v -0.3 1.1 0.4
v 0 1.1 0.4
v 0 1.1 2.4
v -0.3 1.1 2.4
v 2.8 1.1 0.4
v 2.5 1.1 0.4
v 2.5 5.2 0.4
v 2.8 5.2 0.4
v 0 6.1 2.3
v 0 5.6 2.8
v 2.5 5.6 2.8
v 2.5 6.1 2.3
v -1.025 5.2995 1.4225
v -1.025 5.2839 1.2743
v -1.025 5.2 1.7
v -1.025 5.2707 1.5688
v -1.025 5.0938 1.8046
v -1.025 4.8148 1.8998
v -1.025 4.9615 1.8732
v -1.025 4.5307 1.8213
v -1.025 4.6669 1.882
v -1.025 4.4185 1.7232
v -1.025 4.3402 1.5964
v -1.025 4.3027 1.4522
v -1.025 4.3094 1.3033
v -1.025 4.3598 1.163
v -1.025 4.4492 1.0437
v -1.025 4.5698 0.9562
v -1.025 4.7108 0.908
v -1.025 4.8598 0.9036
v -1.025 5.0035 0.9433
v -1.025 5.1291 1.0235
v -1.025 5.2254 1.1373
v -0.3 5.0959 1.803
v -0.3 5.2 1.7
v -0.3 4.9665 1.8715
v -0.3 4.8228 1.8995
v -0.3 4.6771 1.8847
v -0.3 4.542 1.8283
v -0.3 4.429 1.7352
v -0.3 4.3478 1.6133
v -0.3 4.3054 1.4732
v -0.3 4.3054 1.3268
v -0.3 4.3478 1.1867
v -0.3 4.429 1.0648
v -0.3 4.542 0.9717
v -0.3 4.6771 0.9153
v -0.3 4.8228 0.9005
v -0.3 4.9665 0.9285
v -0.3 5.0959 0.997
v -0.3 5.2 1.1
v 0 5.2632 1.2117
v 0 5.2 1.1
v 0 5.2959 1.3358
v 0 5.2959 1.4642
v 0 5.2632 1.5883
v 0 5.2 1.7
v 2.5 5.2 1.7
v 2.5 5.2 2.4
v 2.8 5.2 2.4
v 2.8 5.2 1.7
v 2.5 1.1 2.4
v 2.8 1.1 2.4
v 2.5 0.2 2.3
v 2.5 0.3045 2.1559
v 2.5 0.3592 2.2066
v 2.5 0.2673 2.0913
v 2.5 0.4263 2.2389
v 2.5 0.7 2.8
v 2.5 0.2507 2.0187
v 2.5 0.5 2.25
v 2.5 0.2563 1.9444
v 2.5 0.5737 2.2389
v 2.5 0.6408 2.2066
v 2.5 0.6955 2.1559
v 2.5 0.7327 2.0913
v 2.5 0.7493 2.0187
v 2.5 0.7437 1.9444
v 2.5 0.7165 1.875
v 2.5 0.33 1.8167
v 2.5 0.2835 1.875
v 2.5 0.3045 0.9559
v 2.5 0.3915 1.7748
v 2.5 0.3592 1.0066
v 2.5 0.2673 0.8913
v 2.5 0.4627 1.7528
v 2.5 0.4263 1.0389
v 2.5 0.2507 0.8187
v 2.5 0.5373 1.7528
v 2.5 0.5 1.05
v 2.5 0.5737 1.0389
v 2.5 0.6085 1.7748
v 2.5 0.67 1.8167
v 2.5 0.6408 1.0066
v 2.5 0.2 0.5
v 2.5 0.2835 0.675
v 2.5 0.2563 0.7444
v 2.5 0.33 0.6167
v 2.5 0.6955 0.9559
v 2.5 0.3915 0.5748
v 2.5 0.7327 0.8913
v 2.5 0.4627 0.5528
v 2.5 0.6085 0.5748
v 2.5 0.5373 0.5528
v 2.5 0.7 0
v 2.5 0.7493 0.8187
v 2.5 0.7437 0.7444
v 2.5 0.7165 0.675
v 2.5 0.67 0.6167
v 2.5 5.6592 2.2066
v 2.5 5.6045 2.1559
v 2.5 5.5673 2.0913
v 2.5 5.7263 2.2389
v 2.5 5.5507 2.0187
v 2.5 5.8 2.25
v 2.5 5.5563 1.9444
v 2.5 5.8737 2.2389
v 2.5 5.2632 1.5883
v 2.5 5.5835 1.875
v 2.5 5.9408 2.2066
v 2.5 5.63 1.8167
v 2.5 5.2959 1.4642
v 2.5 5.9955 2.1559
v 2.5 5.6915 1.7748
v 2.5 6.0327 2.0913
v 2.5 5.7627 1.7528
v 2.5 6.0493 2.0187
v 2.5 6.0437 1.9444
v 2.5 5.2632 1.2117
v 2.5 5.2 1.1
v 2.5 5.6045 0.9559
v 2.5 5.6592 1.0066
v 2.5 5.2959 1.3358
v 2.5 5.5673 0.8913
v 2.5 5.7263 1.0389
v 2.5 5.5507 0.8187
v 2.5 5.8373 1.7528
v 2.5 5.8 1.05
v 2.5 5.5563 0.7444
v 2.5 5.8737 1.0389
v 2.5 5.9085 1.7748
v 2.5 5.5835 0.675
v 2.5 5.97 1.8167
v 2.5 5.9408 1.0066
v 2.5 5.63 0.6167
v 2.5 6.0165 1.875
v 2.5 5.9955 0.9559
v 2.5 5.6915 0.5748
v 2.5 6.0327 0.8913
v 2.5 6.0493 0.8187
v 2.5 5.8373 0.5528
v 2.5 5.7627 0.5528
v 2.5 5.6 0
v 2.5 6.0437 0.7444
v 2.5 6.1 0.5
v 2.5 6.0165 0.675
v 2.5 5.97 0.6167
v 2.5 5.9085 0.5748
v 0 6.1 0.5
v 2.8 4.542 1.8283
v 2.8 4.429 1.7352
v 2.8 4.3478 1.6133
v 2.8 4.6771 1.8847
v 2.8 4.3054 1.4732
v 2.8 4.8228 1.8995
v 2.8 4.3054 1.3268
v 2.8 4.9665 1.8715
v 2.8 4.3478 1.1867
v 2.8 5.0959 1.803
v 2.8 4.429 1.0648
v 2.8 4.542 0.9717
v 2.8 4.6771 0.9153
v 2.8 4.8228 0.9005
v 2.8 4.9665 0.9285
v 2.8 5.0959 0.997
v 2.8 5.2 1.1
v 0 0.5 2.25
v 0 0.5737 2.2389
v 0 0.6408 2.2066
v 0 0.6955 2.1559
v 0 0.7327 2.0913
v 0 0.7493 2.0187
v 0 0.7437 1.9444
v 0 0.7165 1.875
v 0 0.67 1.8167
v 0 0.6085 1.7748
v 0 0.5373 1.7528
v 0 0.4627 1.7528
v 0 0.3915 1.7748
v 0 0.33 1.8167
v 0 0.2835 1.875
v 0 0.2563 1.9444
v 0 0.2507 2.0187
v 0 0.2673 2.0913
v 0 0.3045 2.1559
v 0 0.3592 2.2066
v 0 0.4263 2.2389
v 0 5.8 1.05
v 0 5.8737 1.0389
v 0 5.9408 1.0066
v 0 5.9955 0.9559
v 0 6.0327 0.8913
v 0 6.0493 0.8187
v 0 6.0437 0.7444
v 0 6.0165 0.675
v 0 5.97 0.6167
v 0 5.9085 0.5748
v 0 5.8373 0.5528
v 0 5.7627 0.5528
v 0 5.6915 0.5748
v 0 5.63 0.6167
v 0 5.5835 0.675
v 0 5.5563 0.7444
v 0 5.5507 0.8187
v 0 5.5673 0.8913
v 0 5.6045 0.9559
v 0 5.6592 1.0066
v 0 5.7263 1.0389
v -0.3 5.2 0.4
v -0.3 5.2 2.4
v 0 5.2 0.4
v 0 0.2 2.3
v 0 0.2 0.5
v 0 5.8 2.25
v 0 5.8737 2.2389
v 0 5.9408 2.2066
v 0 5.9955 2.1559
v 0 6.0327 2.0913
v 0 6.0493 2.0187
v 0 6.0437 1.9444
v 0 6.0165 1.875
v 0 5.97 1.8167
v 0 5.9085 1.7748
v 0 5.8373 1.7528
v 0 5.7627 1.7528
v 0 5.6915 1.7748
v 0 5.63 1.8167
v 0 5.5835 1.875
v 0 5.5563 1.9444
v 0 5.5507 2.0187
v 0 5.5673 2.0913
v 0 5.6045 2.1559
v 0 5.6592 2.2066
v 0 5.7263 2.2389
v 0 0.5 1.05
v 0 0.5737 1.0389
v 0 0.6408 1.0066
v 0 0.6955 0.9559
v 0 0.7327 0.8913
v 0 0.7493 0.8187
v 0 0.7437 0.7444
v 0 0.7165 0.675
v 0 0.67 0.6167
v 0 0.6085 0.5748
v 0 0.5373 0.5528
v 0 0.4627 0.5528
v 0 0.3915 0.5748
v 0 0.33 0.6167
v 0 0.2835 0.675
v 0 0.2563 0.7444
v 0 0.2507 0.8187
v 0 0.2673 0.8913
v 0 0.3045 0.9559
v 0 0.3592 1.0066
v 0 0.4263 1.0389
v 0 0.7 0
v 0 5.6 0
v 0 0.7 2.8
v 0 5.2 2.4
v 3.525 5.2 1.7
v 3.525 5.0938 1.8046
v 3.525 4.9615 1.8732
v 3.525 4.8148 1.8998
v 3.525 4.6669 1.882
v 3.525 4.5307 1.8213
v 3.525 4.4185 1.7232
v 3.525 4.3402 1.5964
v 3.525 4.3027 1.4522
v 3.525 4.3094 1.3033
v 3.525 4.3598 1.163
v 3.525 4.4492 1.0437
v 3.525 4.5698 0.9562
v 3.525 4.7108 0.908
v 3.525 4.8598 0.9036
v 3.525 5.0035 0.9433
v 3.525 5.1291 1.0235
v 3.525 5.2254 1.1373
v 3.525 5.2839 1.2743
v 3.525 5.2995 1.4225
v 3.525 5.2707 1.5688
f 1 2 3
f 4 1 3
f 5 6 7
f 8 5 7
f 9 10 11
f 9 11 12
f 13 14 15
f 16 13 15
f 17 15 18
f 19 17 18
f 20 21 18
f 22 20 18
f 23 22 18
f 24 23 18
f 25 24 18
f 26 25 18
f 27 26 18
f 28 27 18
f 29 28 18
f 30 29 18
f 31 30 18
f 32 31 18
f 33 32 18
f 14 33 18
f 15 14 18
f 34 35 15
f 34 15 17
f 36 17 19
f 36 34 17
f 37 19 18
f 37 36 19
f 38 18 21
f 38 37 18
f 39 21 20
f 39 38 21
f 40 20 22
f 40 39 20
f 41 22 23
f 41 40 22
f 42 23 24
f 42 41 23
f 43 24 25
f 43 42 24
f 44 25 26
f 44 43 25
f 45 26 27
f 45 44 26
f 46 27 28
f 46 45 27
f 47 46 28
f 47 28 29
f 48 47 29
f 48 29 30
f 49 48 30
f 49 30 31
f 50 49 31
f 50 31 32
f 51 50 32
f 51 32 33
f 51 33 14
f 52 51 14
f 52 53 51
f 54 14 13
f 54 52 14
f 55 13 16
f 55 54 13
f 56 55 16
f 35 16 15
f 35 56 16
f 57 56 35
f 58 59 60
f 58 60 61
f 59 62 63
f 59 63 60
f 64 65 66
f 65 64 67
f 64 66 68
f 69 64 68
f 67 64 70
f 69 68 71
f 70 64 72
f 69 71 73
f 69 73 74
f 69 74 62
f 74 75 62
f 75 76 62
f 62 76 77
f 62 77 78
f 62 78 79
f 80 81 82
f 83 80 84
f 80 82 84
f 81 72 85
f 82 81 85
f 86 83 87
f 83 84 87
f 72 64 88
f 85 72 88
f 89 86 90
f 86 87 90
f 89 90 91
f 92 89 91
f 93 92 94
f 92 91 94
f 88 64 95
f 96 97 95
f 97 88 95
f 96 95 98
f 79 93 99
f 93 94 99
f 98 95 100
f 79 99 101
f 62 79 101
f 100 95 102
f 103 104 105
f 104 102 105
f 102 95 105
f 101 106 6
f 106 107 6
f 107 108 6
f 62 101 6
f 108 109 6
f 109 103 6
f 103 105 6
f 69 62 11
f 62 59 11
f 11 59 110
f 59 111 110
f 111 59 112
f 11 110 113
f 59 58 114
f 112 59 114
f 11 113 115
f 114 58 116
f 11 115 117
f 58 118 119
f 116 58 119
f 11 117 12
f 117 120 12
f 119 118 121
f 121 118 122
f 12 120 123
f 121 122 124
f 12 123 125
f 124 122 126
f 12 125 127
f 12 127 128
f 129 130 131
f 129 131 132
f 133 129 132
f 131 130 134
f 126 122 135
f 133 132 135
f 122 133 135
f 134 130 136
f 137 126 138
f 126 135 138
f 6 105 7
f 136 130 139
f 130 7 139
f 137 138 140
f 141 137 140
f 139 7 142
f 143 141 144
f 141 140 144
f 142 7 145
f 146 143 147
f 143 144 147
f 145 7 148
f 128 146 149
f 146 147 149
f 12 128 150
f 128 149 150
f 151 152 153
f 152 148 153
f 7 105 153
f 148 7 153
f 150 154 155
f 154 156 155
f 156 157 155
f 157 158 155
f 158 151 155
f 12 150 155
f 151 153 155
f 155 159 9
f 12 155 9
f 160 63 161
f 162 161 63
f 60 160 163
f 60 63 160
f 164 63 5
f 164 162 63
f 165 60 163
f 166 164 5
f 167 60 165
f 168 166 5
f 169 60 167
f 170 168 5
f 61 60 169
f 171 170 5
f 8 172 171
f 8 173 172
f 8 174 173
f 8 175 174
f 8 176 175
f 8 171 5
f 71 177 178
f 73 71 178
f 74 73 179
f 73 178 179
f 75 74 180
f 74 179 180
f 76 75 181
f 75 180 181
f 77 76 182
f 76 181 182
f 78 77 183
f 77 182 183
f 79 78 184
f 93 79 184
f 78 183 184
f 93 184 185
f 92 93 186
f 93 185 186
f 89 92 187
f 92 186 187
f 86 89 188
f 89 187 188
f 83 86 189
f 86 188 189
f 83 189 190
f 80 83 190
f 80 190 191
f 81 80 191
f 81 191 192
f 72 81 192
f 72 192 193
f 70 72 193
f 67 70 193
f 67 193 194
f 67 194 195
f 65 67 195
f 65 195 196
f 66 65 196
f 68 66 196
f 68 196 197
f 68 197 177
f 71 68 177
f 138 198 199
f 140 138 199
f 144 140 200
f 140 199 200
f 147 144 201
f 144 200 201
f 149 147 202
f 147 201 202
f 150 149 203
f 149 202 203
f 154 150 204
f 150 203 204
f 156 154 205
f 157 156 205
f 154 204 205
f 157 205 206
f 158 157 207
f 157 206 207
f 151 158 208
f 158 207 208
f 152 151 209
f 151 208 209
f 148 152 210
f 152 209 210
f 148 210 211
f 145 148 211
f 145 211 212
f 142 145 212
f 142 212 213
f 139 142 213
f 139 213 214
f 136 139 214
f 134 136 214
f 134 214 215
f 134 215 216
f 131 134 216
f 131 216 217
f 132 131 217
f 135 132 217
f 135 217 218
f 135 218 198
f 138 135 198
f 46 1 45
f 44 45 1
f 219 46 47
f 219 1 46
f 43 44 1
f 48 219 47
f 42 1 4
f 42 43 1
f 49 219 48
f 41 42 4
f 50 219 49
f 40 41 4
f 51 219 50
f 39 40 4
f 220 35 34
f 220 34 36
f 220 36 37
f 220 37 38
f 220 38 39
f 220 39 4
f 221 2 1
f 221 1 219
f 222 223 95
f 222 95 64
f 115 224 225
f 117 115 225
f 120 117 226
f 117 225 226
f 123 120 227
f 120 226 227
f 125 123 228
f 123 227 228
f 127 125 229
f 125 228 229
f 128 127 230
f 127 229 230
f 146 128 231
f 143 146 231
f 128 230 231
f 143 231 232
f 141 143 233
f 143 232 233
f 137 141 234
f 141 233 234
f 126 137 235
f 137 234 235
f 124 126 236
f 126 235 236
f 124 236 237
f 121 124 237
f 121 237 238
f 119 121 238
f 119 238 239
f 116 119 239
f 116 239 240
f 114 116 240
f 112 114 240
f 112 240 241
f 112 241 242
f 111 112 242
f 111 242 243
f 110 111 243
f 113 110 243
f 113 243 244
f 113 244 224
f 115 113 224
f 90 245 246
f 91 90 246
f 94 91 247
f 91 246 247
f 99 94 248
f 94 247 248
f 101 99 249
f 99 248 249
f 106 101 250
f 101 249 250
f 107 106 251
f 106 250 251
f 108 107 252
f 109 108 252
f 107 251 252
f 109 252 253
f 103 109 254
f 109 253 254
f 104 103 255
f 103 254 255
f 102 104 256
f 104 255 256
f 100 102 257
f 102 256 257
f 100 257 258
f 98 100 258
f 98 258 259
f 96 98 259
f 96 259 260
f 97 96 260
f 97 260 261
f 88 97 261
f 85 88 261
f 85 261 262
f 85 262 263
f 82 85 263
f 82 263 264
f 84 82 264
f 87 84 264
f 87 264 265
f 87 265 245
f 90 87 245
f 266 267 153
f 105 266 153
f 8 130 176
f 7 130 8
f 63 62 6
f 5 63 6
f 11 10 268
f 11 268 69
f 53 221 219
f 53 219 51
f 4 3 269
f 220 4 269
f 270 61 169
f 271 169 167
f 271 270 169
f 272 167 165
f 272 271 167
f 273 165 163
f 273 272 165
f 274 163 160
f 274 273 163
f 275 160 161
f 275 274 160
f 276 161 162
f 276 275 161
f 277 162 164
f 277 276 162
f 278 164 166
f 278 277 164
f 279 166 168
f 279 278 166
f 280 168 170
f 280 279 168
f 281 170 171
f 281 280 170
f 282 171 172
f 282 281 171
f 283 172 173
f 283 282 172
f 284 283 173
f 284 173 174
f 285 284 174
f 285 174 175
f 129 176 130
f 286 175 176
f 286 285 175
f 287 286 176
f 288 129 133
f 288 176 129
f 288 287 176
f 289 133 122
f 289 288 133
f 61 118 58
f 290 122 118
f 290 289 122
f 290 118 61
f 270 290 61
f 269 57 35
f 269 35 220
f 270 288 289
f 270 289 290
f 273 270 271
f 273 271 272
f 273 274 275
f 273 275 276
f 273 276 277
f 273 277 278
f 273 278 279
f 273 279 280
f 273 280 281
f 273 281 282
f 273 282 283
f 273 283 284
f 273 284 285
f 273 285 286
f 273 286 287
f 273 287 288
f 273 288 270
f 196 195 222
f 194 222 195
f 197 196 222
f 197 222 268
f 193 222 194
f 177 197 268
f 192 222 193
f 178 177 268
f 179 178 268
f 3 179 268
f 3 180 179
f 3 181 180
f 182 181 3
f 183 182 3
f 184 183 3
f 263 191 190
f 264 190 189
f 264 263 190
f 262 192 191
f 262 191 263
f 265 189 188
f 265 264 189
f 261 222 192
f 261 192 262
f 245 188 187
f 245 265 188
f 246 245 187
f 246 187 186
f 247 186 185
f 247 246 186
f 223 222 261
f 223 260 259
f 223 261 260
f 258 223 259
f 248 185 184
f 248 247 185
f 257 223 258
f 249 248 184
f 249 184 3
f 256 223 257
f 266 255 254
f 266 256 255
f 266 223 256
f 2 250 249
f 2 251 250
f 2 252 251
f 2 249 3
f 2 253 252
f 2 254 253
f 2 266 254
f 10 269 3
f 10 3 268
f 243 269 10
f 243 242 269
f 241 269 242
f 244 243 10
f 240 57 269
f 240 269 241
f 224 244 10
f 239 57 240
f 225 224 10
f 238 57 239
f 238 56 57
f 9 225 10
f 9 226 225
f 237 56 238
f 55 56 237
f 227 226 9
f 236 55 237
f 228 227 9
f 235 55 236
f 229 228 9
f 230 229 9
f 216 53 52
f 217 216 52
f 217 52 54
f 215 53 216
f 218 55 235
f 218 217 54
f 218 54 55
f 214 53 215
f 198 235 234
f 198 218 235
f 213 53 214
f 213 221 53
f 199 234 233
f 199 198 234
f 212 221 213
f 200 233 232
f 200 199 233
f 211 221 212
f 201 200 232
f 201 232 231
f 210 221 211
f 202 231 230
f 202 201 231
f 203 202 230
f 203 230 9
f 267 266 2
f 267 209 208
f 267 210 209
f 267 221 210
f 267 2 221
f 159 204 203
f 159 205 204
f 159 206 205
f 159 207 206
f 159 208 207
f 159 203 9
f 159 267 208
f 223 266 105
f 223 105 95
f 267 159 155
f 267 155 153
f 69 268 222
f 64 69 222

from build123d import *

# Parameters (mm, degrees)
SKETCH1_W           = 2.5
SKETCH1_H           = 6.3
BOSS_EXTRUDE2_DEPTH = 2.8
SKETCH3_W           = 2
SKETCH3_H           = 4.1
BOSS_EXTRUDE3_DEPTH = 0.3
SKETCH4_W           = 2
SKETCH4_H           = 4.1
BOSS_EXTRUDE4_DEPTH = 0.3
SKETCH5_R           = 0.25
CUT_EXTRUDE1_DEPTH  = 10.3
FILLET1_R           = 0.2
SKETCH6_R           = 0.5
BOSS_EXTRUDE5_DEPTH = 2.275
CUT_EXTRUDE2_DEPTH  = 10
CUT_EXTRUDE3_DEPTH  = 10


with BuildPart() as part:
    # Sketch1 → Boss-Extrude2 (new body)
    with BuildSketch(Plane.XY):
        with Locations((1.25, 3.15)):
            Rectangle(SKETCH1_W, SKETCH1_H)
    extrude(amount=BOSS_EXTRUDE2_DEPTH)

    # Sketch3 → Boss-Extrude3 (add)
    with BuildSketch(Plane(origin=(2.5, 0, 0), x_dir=(0, 0, -1), z_dir=(1, 0, 0))):
        with Locations((-1.4, 3.15)):
            Rectangle(SKETCH3_W, SKETCH3_H)
    extrude(amount=BOSS_EXTRUDE3_DEPTH)

    # Sketch4 → Boss-Extrude4 (add)
    with BuildSketch(Plane.ZY):
        with Locations((1.4, 3.15)):
            Rectangle(SKETCH4_W, SKETCH4_H)
    extrude(amount=BOSS_EXTRUDE4_DEPTH)

    # Sketch5 → Cut-Extrude1 (cut)
    with BuildSketch(Plane.ZY):
        with Locations((0.8, 0.5)):
            Circle(SKETCH5_R)
        with Locations((2, 0.5)):
            Circle(SKETCH5_R)
        with Locations((0.8, 5.8)):
            Circle(SKETCH5_R)
        with Locations((2, 5.8)):
            Circle(SKETCH5_R)
    extrude(amount=-CUT_EXTRUDE1_DEPTH, mode=Mode.SUBTRACT)

    # Fillet1
    fillet1_edges = [part.edges().sort_by_distance(p)[0] for p in [
        (1.25, 6.3, 2.8),
        (1.25, 6.3, 0),
        (1.25, 0, 0),
        (1.25, 0, 2.8),
    ]]
    fillet(fillet1_edges, radius=FILLET1_R)

    # Sketch6 → Boss-Extrude5 (add, symmetric)
    with BuildSketch(Plane(origin=(1.25, 0, 0), x_dir=(0, 0, -1), z_dir=(1, 0, 0))):
        with Locations(Location((-1.4, 4.8, 0), (0, 0, 126.869897646))):
            Circle(SKETCH6_R)
    extrude(amount=BOSS_EXTRUDE5_DEPTH, both=True)

    # Sketch7 → Cut-Extrude2 (cut)
    with BuildSketch(Plane.ZY):
        Polygon((0, 6.1), (2.8, 6.1), (2.8, 6.3), (2.6, 6.3), (0.2, 6.3), (0, 6.3), align=None)
        Polygon((0, 0.2), (2.8, 0.2), (2.8, 0), (2.6, 0), (0.2, 0), (0, 0), align=None)
    extrude(amount=-CUT_EXTRUDE2_DEPTH, mode=Mode.SUBTRACT)

    # Sketch8 → Cut-Extrude3 (cut)
    with BuildSketch(Plane.ZY):
        Polygon((2.8, 6.1), (2.8, 5.6), (2.3, 6.1), align=None)
        Polygon((0, 6.1), (0.5, 6.1), (0, 5.6), align=None)
        Polygon((0, 0.2), (0, 0.7), (0.5, 0.2), align=None)
        Polygon((2.8, 0.2), (2.8, 0.7), (2.3, 0.2), align=None)
    extrude(amount=-CUT_EXTRUDE3_DEPTH, mode=Mode.SUBTRACT)


solid = part.part
